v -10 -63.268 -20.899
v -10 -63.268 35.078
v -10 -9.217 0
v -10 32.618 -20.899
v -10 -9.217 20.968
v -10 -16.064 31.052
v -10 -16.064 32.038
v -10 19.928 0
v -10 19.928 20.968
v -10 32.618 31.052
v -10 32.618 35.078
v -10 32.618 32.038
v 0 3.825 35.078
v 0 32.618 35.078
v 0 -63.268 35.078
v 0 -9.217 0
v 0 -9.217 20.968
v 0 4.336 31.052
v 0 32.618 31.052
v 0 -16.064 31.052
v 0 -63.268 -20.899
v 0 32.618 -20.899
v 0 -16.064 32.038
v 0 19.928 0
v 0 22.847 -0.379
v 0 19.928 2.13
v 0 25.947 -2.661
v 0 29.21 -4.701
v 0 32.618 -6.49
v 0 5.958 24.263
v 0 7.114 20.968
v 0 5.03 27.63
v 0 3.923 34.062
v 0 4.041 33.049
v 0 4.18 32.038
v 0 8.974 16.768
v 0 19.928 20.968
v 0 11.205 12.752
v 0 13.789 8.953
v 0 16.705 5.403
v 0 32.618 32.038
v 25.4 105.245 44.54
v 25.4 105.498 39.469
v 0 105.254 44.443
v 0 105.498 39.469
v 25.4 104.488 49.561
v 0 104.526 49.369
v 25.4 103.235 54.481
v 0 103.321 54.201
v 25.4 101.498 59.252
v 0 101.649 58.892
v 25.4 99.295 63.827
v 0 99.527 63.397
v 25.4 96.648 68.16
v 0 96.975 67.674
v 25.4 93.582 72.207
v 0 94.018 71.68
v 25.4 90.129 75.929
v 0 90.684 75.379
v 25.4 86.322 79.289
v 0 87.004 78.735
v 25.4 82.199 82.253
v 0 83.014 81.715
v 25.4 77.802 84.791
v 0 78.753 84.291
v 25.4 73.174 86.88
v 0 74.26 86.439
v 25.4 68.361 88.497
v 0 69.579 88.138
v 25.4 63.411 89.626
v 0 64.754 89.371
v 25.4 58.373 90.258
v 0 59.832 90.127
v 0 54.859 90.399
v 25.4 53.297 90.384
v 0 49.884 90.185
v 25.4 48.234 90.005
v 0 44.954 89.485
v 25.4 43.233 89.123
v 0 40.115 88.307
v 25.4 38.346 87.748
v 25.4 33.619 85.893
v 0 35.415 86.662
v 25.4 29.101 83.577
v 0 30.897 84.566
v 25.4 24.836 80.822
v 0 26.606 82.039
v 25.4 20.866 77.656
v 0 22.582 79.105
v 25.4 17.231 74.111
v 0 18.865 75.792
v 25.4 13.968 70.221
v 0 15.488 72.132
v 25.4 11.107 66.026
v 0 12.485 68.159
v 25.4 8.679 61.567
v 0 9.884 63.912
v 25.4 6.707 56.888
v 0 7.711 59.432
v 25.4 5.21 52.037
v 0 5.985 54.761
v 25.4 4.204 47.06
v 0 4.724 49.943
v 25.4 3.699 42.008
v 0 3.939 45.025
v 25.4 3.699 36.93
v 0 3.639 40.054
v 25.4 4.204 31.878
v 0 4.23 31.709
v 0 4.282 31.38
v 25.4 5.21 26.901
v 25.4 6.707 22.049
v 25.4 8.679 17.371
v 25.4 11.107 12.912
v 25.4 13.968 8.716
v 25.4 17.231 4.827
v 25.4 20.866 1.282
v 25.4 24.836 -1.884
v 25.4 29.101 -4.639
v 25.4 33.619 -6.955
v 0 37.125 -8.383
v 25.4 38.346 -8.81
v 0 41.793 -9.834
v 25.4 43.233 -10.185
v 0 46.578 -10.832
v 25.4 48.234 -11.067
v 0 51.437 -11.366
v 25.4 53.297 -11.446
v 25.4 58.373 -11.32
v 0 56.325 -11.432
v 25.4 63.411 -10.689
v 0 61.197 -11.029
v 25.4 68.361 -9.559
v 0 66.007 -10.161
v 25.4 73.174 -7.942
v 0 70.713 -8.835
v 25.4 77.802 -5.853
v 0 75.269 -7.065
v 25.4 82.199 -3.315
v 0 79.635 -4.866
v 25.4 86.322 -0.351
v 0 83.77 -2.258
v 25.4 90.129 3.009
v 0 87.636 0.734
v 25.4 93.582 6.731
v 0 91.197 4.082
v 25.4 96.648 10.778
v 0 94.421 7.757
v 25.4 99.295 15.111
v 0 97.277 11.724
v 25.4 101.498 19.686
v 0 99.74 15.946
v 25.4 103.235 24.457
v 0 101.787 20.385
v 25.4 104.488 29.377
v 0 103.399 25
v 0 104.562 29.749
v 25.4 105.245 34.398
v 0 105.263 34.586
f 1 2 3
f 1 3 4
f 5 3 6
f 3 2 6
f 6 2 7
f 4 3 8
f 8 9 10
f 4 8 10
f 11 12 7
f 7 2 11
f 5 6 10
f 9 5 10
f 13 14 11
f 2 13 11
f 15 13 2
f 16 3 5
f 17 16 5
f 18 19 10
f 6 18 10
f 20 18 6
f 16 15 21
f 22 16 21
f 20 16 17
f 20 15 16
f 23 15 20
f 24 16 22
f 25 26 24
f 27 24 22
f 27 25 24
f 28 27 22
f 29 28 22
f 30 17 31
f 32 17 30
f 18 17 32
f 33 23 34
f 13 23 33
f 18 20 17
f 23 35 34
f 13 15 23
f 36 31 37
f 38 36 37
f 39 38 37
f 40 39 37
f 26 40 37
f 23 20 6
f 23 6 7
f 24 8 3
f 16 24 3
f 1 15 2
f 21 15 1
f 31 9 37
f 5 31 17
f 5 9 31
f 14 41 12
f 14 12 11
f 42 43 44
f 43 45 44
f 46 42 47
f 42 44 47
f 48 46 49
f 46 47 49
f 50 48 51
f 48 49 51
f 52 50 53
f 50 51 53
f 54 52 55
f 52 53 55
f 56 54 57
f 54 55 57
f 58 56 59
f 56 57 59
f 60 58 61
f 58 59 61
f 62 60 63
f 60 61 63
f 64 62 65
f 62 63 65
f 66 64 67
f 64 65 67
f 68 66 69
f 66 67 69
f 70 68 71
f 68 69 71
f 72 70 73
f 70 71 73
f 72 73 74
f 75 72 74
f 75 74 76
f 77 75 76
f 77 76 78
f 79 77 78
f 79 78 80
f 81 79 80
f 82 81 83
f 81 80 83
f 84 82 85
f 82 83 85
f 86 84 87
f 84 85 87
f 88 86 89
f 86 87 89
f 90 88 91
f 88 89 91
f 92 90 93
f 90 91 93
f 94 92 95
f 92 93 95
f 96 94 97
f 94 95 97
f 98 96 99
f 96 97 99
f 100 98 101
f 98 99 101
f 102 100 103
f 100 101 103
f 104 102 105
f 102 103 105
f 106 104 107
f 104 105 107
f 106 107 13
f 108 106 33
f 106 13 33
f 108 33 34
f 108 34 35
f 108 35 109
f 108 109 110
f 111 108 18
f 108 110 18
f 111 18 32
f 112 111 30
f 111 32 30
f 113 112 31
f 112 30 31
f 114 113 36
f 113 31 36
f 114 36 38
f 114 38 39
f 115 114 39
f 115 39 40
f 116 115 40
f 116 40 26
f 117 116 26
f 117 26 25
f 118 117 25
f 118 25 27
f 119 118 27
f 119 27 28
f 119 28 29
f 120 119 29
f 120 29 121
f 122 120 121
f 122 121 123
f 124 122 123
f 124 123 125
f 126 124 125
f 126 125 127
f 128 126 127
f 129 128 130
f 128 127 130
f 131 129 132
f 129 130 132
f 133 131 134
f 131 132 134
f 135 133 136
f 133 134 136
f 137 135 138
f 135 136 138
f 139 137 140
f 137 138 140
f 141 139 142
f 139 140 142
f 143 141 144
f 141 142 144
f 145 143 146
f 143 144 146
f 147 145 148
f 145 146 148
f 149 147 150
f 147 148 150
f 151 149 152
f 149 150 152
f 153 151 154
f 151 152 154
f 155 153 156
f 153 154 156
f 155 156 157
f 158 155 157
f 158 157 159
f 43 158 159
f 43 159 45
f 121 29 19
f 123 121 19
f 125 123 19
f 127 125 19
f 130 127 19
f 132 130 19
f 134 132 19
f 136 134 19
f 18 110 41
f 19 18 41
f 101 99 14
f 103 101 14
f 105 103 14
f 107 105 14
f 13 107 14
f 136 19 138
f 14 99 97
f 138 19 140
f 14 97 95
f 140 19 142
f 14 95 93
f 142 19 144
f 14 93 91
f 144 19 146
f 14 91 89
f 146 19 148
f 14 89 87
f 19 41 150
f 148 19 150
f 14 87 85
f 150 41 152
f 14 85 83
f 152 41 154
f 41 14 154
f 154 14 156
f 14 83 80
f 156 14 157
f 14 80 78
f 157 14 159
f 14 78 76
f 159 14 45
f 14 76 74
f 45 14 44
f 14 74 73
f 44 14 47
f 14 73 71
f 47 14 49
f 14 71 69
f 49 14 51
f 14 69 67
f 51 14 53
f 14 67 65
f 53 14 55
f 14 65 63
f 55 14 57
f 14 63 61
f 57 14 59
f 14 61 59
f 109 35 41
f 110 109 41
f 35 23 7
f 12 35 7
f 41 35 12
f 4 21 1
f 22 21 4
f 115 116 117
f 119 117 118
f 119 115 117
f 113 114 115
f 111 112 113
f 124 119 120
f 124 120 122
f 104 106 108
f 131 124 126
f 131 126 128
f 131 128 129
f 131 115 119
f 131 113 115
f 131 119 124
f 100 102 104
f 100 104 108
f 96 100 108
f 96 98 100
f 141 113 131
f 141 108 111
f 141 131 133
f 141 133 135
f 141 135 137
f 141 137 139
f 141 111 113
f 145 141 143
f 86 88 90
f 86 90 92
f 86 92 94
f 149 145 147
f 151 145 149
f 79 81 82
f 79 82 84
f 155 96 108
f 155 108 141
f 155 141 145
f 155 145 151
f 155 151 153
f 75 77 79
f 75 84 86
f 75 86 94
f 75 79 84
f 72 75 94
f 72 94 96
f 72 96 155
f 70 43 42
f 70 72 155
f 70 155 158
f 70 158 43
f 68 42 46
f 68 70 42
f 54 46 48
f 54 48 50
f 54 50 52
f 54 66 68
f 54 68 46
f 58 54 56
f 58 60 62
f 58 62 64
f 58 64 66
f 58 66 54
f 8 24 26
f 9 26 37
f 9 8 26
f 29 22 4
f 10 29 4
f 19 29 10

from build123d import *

# Parameters (mm, degrees)
F2_DEPTH  = 10
F3_W      = 29.145509
F3_H      = 20.968225
F4_DEPTH  = 25.4
F5_R      = 50.931249
F6_DEPTH  = 25.4
F6_FACE_R = 50.931249
F7_DEPTH  = 25


with BuildPart() as f2:
    # F0 (on Right) → F2 (new body)
    with BuildSketch(Plane.YZ):
        Polygon((-16.064236, 31.052269), (-16.064236, 32.037951), (32.617681, 32.037951), (32.617681, 35.078097), (-63.268401, 35.078097), (-63.268401, -20.898964), (32.617681, -20.898964), (32.617681, 31.052269), align=None)
    extrude(amount=-F2_DEPTH)

    # F3 (on face) → F4 (cut)
    with BuildSketch(Plane(origin=(-10, 0, 0), x_dir=(0, -1, 0), z_dir=(-1, 0, 0))):
        with Locations((-5.355574, 10.484113)):
            Rectangle(F3_W, F3_H)
    extrude(amount=-F4_DEPTH, mode=Mode.SUBTRACT)

    # F5 (on Right) → F6 (join)
    with BuildSketch(Plane.YZ):
        with Locations((54.566488, 39.468978)):
            Circle(F5_R)
    extrude(amount=F6_DEPTH)

    # F6_face (on face) → F7 (join)
    with BuildSketch(Plane(origin=(25.4, 54.566488, 39.468978), x_dir=(0, 1, 0), z_dir=(1, 0, 0))):
        Circle(F6_FACE_R)
    extrude(amount=-F7_DEPTH)


solid = f2.part
